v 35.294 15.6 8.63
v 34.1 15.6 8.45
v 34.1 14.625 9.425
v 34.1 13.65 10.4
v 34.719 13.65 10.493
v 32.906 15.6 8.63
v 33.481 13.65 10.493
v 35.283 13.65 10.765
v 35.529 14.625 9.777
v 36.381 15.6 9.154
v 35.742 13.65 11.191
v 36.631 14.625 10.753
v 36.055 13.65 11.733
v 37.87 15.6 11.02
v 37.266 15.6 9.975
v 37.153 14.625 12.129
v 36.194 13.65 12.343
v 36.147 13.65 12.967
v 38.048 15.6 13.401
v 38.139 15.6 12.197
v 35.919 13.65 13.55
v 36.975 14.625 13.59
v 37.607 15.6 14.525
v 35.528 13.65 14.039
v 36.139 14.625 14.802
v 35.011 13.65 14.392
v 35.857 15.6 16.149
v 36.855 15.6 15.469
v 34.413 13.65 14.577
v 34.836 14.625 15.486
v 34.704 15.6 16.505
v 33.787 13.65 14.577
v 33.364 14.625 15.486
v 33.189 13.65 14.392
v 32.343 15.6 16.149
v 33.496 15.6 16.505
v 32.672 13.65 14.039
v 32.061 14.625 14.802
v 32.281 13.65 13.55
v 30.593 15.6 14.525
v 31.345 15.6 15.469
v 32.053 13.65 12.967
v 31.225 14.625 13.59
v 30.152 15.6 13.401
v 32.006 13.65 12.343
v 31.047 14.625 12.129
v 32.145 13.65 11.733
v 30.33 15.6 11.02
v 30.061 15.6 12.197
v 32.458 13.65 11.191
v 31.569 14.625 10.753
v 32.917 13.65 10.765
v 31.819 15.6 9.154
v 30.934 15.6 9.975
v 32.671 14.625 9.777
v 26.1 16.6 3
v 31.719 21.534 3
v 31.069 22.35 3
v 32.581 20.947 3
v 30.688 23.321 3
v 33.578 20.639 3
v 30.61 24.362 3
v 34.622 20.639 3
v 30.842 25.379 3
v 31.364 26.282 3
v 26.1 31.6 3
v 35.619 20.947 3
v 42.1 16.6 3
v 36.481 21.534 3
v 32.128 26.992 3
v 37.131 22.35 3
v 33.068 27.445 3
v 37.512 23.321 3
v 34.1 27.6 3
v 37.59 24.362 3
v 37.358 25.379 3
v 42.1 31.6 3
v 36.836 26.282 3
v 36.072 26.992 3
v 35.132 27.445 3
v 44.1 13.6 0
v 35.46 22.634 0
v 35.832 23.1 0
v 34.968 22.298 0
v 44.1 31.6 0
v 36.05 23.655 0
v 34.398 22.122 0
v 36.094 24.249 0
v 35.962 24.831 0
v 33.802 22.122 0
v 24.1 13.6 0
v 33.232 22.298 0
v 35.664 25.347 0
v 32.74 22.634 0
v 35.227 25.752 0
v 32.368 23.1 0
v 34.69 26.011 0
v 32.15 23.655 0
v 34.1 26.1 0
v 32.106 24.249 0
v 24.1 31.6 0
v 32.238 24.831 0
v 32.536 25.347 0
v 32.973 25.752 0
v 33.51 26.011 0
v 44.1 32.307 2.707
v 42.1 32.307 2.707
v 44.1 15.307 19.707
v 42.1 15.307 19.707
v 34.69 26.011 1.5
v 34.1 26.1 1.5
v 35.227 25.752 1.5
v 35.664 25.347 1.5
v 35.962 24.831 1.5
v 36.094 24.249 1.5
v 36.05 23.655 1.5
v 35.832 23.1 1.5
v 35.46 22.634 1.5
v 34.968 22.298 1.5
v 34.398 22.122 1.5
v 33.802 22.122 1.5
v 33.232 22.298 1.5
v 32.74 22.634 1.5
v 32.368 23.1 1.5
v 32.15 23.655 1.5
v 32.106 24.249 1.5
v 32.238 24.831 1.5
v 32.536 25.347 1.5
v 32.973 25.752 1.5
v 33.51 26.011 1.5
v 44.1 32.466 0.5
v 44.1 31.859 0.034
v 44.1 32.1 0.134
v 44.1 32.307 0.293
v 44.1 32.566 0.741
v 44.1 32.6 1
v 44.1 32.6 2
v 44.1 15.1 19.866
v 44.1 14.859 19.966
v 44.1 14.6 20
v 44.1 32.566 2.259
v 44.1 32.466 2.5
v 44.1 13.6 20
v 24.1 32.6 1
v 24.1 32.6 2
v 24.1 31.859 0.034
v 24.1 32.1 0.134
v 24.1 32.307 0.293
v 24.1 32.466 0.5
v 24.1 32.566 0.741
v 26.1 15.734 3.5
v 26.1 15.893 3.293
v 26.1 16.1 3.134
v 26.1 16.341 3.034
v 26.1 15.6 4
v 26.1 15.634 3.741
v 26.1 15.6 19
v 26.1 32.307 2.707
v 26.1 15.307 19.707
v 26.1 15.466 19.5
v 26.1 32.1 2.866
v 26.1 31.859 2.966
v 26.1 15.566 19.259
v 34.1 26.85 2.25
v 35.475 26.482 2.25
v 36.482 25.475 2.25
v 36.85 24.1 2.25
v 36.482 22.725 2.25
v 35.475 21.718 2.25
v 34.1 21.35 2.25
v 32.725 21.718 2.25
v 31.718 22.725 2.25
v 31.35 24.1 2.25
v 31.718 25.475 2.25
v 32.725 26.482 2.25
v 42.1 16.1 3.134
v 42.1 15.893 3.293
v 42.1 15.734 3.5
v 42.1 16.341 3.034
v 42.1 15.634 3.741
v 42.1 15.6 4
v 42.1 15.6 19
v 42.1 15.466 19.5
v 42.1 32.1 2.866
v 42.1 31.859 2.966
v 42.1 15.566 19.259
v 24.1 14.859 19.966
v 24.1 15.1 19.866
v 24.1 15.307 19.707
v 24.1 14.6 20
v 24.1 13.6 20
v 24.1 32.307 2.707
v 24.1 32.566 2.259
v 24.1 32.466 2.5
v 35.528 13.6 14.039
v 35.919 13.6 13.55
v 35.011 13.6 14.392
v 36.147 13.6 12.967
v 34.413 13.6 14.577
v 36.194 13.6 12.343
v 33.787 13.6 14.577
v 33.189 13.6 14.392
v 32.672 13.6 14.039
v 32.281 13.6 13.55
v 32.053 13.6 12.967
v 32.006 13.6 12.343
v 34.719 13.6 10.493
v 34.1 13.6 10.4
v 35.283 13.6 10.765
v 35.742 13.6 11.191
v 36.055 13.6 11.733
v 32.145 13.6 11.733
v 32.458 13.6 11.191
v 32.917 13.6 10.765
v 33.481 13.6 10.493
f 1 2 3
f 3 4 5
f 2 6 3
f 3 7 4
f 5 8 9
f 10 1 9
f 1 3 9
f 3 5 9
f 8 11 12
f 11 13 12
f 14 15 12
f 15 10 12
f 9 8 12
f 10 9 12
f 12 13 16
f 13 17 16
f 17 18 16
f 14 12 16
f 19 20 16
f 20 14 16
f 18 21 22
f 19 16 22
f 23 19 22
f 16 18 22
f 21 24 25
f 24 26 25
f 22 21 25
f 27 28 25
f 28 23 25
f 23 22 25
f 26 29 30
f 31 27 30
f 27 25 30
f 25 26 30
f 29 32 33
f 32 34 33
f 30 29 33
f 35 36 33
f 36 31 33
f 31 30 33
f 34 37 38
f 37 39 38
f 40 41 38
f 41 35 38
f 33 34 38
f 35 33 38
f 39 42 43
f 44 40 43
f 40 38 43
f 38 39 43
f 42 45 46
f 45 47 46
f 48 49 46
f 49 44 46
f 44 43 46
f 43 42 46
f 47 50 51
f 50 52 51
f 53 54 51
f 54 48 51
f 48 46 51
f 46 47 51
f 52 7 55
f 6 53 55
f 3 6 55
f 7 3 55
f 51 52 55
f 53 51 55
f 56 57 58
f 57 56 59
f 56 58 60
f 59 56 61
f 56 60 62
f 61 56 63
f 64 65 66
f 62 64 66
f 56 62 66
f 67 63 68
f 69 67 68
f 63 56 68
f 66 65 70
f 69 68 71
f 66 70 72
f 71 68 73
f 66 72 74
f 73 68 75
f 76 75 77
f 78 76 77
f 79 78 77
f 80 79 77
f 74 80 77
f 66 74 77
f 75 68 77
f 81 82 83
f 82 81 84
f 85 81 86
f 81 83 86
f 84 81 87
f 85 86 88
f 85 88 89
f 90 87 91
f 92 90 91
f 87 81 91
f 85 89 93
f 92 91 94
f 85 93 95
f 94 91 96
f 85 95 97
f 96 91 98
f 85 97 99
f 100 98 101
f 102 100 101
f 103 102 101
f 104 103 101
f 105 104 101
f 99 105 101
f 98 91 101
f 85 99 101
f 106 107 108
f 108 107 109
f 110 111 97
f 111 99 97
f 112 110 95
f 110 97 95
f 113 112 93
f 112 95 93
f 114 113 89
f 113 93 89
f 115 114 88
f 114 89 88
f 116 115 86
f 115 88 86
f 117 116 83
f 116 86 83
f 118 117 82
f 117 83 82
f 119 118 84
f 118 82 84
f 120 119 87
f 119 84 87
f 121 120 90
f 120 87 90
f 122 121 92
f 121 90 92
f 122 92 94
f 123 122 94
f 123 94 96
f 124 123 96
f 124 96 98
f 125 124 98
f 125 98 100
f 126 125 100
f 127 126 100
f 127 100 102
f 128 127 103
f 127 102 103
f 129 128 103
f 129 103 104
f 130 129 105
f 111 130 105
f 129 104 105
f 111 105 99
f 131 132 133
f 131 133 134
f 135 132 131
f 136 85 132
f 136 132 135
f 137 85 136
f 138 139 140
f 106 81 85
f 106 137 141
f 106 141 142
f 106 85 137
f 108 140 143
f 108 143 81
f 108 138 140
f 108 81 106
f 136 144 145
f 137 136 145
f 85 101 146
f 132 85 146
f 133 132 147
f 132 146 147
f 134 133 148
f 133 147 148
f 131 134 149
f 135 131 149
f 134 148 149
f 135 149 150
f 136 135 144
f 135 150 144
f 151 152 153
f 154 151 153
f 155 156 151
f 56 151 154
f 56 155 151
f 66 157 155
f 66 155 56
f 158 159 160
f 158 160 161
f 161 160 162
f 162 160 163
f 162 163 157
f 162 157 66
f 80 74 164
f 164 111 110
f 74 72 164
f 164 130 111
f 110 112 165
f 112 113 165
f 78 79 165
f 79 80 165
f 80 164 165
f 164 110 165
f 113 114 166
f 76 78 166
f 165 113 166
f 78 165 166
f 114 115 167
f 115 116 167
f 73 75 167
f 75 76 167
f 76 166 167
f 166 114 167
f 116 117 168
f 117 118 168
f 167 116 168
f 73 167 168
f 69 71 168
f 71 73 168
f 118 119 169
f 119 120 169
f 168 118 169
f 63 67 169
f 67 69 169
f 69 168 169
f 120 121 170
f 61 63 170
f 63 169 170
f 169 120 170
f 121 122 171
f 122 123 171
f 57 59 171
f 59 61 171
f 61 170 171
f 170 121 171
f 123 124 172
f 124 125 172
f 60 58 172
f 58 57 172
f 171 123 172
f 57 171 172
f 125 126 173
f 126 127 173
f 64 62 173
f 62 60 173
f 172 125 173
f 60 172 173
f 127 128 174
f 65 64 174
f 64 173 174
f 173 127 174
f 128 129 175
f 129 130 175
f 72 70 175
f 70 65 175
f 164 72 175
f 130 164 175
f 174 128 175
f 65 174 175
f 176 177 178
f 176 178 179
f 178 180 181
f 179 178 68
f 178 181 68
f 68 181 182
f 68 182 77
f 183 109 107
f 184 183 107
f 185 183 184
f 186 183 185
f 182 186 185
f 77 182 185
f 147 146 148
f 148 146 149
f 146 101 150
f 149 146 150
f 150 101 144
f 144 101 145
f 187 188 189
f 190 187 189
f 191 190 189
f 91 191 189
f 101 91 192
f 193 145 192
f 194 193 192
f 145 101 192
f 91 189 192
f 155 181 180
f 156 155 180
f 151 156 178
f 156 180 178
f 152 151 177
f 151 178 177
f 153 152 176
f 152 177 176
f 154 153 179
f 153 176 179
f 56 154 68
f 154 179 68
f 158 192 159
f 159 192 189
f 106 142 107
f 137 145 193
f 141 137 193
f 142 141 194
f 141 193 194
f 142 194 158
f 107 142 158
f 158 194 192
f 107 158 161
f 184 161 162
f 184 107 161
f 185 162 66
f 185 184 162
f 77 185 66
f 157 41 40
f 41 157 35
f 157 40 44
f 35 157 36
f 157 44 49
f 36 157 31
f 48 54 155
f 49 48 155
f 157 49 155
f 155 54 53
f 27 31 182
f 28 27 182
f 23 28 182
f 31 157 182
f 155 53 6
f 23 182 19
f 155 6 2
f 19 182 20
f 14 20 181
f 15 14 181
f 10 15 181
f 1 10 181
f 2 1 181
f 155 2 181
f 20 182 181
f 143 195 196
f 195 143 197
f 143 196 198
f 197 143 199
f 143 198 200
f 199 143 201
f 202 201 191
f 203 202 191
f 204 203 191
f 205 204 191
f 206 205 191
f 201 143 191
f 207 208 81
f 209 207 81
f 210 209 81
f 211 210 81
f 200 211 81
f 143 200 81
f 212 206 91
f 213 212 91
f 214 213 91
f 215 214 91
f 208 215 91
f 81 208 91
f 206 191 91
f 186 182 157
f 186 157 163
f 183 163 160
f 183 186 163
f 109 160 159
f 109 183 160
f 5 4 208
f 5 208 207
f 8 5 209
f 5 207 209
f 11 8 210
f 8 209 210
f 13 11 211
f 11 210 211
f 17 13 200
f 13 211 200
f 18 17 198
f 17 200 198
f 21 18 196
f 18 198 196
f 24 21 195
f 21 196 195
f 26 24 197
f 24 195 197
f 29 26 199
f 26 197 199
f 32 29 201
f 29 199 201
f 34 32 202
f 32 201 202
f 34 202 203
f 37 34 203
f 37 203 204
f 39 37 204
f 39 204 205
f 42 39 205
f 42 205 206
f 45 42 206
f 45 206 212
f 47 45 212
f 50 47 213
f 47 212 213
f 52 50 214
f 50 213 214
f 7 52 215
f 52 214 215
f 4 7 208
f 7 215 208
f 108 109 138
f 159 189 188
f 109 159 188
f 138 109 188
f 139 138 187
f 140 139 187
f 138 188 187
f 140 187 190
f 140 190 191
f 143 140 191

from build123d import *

# Parameters (mm, degrees)
PAD001_DEPTH            = 20
POCKET001_DEPTH         = 16
HOLE002_D               = 4
HOLE002_CSINK_D         = 7
HOLE002_CSINK_ANGLE     = 90
HOLE003_D               = 4.2
HOLE003_DEPTH           = 25
HOLE003_CSINK_D         = 8.1
HOLE003_CSINK_ANGLE     = 90
BODY001_PLACEMENT_ANGLE = 90


with BuildPart() as part:
    # Sketch004 → Pad001 (new body)
    with BuildSketch(Plane.XZ):
        with BuildLine():
            Line((1, 0), (19, 0))
            ThreePointArc((19, 0), (19.707107, 0.292893), (20, 1))
            Line((20, 1), (20, 2))
            ThreePointArc((20, 2), (19.92388, 2.382683), (19.707107, 2.707107))
            Line((19.707107, 2.707107), (2.707107, 19.707107))
            ThreePointArc((2.707107, 19.707107), (2.382683, 19.92388), (2, 20))
            Line((2, 20), (1, 20))
            Line((1, 20), (1, 0))
        make_face()
    extrude(amount=PAD001_DEPTH)

    # Sketch005 (on Face10 of Pad001) → Pocket001 (cut)
    with BuildSketch(Plane.XZ.offset(18)):
        with BuildLine():
            Line((3, 19), (3, 4))
            ThreePointArc((3, 4), (3.292893, 3.292893), (4, 3))
            Line((4, 3), (19, 3))
            ThreePointArc((20, 2), (19.707107, 2.707107), (19, 3))
            Line((20, 20), (20, 2))
            Line((2, 20), (20, 20))
            ThreePointArc((3, 19), (2.707107, 19.707107), (2, 20))
        make_face()
    extrude(amount=-POCKET001_DEPTH, mode=Mode.SUBTRACT)

    # Hole002 (through all)
    with Locations(Plane(origin=(0, 0, 3), x_dir=(-1, 0, 0), z_dir=(0, 0, 1))):
        with Locations((-11.5, 10)):
            CounterSinkHole(HOLE002_D / 2, HOLE002_CSINK_D / 2, counter_sink_angle=HOLE002_CSINK_ANGLE)

    # Hole003
    with Locations(Plane(origin=(3, 0, 0), x_dir=(0, 0, 1), z_dir=(1, 0, 0))):
        with Locations((12.5, 10)):
            CounterSinkHole(HOLE003_D / 2, HOLE003_CSINK_D / 2, depth=HOLE003_DEPTH, counter_sink_angle=HOLE003_CSINK_ANGLE)


with BuildPart() as part_1:
    # Body001 placement: moved
    add(part.part.moved(Location((24.1, 12.6, 0))).rotate(Axis((24.1, 12.6, 0), (0, 0, 1)), BODY001_PLACEMENT_ANGLE))


solid = part_1.part
